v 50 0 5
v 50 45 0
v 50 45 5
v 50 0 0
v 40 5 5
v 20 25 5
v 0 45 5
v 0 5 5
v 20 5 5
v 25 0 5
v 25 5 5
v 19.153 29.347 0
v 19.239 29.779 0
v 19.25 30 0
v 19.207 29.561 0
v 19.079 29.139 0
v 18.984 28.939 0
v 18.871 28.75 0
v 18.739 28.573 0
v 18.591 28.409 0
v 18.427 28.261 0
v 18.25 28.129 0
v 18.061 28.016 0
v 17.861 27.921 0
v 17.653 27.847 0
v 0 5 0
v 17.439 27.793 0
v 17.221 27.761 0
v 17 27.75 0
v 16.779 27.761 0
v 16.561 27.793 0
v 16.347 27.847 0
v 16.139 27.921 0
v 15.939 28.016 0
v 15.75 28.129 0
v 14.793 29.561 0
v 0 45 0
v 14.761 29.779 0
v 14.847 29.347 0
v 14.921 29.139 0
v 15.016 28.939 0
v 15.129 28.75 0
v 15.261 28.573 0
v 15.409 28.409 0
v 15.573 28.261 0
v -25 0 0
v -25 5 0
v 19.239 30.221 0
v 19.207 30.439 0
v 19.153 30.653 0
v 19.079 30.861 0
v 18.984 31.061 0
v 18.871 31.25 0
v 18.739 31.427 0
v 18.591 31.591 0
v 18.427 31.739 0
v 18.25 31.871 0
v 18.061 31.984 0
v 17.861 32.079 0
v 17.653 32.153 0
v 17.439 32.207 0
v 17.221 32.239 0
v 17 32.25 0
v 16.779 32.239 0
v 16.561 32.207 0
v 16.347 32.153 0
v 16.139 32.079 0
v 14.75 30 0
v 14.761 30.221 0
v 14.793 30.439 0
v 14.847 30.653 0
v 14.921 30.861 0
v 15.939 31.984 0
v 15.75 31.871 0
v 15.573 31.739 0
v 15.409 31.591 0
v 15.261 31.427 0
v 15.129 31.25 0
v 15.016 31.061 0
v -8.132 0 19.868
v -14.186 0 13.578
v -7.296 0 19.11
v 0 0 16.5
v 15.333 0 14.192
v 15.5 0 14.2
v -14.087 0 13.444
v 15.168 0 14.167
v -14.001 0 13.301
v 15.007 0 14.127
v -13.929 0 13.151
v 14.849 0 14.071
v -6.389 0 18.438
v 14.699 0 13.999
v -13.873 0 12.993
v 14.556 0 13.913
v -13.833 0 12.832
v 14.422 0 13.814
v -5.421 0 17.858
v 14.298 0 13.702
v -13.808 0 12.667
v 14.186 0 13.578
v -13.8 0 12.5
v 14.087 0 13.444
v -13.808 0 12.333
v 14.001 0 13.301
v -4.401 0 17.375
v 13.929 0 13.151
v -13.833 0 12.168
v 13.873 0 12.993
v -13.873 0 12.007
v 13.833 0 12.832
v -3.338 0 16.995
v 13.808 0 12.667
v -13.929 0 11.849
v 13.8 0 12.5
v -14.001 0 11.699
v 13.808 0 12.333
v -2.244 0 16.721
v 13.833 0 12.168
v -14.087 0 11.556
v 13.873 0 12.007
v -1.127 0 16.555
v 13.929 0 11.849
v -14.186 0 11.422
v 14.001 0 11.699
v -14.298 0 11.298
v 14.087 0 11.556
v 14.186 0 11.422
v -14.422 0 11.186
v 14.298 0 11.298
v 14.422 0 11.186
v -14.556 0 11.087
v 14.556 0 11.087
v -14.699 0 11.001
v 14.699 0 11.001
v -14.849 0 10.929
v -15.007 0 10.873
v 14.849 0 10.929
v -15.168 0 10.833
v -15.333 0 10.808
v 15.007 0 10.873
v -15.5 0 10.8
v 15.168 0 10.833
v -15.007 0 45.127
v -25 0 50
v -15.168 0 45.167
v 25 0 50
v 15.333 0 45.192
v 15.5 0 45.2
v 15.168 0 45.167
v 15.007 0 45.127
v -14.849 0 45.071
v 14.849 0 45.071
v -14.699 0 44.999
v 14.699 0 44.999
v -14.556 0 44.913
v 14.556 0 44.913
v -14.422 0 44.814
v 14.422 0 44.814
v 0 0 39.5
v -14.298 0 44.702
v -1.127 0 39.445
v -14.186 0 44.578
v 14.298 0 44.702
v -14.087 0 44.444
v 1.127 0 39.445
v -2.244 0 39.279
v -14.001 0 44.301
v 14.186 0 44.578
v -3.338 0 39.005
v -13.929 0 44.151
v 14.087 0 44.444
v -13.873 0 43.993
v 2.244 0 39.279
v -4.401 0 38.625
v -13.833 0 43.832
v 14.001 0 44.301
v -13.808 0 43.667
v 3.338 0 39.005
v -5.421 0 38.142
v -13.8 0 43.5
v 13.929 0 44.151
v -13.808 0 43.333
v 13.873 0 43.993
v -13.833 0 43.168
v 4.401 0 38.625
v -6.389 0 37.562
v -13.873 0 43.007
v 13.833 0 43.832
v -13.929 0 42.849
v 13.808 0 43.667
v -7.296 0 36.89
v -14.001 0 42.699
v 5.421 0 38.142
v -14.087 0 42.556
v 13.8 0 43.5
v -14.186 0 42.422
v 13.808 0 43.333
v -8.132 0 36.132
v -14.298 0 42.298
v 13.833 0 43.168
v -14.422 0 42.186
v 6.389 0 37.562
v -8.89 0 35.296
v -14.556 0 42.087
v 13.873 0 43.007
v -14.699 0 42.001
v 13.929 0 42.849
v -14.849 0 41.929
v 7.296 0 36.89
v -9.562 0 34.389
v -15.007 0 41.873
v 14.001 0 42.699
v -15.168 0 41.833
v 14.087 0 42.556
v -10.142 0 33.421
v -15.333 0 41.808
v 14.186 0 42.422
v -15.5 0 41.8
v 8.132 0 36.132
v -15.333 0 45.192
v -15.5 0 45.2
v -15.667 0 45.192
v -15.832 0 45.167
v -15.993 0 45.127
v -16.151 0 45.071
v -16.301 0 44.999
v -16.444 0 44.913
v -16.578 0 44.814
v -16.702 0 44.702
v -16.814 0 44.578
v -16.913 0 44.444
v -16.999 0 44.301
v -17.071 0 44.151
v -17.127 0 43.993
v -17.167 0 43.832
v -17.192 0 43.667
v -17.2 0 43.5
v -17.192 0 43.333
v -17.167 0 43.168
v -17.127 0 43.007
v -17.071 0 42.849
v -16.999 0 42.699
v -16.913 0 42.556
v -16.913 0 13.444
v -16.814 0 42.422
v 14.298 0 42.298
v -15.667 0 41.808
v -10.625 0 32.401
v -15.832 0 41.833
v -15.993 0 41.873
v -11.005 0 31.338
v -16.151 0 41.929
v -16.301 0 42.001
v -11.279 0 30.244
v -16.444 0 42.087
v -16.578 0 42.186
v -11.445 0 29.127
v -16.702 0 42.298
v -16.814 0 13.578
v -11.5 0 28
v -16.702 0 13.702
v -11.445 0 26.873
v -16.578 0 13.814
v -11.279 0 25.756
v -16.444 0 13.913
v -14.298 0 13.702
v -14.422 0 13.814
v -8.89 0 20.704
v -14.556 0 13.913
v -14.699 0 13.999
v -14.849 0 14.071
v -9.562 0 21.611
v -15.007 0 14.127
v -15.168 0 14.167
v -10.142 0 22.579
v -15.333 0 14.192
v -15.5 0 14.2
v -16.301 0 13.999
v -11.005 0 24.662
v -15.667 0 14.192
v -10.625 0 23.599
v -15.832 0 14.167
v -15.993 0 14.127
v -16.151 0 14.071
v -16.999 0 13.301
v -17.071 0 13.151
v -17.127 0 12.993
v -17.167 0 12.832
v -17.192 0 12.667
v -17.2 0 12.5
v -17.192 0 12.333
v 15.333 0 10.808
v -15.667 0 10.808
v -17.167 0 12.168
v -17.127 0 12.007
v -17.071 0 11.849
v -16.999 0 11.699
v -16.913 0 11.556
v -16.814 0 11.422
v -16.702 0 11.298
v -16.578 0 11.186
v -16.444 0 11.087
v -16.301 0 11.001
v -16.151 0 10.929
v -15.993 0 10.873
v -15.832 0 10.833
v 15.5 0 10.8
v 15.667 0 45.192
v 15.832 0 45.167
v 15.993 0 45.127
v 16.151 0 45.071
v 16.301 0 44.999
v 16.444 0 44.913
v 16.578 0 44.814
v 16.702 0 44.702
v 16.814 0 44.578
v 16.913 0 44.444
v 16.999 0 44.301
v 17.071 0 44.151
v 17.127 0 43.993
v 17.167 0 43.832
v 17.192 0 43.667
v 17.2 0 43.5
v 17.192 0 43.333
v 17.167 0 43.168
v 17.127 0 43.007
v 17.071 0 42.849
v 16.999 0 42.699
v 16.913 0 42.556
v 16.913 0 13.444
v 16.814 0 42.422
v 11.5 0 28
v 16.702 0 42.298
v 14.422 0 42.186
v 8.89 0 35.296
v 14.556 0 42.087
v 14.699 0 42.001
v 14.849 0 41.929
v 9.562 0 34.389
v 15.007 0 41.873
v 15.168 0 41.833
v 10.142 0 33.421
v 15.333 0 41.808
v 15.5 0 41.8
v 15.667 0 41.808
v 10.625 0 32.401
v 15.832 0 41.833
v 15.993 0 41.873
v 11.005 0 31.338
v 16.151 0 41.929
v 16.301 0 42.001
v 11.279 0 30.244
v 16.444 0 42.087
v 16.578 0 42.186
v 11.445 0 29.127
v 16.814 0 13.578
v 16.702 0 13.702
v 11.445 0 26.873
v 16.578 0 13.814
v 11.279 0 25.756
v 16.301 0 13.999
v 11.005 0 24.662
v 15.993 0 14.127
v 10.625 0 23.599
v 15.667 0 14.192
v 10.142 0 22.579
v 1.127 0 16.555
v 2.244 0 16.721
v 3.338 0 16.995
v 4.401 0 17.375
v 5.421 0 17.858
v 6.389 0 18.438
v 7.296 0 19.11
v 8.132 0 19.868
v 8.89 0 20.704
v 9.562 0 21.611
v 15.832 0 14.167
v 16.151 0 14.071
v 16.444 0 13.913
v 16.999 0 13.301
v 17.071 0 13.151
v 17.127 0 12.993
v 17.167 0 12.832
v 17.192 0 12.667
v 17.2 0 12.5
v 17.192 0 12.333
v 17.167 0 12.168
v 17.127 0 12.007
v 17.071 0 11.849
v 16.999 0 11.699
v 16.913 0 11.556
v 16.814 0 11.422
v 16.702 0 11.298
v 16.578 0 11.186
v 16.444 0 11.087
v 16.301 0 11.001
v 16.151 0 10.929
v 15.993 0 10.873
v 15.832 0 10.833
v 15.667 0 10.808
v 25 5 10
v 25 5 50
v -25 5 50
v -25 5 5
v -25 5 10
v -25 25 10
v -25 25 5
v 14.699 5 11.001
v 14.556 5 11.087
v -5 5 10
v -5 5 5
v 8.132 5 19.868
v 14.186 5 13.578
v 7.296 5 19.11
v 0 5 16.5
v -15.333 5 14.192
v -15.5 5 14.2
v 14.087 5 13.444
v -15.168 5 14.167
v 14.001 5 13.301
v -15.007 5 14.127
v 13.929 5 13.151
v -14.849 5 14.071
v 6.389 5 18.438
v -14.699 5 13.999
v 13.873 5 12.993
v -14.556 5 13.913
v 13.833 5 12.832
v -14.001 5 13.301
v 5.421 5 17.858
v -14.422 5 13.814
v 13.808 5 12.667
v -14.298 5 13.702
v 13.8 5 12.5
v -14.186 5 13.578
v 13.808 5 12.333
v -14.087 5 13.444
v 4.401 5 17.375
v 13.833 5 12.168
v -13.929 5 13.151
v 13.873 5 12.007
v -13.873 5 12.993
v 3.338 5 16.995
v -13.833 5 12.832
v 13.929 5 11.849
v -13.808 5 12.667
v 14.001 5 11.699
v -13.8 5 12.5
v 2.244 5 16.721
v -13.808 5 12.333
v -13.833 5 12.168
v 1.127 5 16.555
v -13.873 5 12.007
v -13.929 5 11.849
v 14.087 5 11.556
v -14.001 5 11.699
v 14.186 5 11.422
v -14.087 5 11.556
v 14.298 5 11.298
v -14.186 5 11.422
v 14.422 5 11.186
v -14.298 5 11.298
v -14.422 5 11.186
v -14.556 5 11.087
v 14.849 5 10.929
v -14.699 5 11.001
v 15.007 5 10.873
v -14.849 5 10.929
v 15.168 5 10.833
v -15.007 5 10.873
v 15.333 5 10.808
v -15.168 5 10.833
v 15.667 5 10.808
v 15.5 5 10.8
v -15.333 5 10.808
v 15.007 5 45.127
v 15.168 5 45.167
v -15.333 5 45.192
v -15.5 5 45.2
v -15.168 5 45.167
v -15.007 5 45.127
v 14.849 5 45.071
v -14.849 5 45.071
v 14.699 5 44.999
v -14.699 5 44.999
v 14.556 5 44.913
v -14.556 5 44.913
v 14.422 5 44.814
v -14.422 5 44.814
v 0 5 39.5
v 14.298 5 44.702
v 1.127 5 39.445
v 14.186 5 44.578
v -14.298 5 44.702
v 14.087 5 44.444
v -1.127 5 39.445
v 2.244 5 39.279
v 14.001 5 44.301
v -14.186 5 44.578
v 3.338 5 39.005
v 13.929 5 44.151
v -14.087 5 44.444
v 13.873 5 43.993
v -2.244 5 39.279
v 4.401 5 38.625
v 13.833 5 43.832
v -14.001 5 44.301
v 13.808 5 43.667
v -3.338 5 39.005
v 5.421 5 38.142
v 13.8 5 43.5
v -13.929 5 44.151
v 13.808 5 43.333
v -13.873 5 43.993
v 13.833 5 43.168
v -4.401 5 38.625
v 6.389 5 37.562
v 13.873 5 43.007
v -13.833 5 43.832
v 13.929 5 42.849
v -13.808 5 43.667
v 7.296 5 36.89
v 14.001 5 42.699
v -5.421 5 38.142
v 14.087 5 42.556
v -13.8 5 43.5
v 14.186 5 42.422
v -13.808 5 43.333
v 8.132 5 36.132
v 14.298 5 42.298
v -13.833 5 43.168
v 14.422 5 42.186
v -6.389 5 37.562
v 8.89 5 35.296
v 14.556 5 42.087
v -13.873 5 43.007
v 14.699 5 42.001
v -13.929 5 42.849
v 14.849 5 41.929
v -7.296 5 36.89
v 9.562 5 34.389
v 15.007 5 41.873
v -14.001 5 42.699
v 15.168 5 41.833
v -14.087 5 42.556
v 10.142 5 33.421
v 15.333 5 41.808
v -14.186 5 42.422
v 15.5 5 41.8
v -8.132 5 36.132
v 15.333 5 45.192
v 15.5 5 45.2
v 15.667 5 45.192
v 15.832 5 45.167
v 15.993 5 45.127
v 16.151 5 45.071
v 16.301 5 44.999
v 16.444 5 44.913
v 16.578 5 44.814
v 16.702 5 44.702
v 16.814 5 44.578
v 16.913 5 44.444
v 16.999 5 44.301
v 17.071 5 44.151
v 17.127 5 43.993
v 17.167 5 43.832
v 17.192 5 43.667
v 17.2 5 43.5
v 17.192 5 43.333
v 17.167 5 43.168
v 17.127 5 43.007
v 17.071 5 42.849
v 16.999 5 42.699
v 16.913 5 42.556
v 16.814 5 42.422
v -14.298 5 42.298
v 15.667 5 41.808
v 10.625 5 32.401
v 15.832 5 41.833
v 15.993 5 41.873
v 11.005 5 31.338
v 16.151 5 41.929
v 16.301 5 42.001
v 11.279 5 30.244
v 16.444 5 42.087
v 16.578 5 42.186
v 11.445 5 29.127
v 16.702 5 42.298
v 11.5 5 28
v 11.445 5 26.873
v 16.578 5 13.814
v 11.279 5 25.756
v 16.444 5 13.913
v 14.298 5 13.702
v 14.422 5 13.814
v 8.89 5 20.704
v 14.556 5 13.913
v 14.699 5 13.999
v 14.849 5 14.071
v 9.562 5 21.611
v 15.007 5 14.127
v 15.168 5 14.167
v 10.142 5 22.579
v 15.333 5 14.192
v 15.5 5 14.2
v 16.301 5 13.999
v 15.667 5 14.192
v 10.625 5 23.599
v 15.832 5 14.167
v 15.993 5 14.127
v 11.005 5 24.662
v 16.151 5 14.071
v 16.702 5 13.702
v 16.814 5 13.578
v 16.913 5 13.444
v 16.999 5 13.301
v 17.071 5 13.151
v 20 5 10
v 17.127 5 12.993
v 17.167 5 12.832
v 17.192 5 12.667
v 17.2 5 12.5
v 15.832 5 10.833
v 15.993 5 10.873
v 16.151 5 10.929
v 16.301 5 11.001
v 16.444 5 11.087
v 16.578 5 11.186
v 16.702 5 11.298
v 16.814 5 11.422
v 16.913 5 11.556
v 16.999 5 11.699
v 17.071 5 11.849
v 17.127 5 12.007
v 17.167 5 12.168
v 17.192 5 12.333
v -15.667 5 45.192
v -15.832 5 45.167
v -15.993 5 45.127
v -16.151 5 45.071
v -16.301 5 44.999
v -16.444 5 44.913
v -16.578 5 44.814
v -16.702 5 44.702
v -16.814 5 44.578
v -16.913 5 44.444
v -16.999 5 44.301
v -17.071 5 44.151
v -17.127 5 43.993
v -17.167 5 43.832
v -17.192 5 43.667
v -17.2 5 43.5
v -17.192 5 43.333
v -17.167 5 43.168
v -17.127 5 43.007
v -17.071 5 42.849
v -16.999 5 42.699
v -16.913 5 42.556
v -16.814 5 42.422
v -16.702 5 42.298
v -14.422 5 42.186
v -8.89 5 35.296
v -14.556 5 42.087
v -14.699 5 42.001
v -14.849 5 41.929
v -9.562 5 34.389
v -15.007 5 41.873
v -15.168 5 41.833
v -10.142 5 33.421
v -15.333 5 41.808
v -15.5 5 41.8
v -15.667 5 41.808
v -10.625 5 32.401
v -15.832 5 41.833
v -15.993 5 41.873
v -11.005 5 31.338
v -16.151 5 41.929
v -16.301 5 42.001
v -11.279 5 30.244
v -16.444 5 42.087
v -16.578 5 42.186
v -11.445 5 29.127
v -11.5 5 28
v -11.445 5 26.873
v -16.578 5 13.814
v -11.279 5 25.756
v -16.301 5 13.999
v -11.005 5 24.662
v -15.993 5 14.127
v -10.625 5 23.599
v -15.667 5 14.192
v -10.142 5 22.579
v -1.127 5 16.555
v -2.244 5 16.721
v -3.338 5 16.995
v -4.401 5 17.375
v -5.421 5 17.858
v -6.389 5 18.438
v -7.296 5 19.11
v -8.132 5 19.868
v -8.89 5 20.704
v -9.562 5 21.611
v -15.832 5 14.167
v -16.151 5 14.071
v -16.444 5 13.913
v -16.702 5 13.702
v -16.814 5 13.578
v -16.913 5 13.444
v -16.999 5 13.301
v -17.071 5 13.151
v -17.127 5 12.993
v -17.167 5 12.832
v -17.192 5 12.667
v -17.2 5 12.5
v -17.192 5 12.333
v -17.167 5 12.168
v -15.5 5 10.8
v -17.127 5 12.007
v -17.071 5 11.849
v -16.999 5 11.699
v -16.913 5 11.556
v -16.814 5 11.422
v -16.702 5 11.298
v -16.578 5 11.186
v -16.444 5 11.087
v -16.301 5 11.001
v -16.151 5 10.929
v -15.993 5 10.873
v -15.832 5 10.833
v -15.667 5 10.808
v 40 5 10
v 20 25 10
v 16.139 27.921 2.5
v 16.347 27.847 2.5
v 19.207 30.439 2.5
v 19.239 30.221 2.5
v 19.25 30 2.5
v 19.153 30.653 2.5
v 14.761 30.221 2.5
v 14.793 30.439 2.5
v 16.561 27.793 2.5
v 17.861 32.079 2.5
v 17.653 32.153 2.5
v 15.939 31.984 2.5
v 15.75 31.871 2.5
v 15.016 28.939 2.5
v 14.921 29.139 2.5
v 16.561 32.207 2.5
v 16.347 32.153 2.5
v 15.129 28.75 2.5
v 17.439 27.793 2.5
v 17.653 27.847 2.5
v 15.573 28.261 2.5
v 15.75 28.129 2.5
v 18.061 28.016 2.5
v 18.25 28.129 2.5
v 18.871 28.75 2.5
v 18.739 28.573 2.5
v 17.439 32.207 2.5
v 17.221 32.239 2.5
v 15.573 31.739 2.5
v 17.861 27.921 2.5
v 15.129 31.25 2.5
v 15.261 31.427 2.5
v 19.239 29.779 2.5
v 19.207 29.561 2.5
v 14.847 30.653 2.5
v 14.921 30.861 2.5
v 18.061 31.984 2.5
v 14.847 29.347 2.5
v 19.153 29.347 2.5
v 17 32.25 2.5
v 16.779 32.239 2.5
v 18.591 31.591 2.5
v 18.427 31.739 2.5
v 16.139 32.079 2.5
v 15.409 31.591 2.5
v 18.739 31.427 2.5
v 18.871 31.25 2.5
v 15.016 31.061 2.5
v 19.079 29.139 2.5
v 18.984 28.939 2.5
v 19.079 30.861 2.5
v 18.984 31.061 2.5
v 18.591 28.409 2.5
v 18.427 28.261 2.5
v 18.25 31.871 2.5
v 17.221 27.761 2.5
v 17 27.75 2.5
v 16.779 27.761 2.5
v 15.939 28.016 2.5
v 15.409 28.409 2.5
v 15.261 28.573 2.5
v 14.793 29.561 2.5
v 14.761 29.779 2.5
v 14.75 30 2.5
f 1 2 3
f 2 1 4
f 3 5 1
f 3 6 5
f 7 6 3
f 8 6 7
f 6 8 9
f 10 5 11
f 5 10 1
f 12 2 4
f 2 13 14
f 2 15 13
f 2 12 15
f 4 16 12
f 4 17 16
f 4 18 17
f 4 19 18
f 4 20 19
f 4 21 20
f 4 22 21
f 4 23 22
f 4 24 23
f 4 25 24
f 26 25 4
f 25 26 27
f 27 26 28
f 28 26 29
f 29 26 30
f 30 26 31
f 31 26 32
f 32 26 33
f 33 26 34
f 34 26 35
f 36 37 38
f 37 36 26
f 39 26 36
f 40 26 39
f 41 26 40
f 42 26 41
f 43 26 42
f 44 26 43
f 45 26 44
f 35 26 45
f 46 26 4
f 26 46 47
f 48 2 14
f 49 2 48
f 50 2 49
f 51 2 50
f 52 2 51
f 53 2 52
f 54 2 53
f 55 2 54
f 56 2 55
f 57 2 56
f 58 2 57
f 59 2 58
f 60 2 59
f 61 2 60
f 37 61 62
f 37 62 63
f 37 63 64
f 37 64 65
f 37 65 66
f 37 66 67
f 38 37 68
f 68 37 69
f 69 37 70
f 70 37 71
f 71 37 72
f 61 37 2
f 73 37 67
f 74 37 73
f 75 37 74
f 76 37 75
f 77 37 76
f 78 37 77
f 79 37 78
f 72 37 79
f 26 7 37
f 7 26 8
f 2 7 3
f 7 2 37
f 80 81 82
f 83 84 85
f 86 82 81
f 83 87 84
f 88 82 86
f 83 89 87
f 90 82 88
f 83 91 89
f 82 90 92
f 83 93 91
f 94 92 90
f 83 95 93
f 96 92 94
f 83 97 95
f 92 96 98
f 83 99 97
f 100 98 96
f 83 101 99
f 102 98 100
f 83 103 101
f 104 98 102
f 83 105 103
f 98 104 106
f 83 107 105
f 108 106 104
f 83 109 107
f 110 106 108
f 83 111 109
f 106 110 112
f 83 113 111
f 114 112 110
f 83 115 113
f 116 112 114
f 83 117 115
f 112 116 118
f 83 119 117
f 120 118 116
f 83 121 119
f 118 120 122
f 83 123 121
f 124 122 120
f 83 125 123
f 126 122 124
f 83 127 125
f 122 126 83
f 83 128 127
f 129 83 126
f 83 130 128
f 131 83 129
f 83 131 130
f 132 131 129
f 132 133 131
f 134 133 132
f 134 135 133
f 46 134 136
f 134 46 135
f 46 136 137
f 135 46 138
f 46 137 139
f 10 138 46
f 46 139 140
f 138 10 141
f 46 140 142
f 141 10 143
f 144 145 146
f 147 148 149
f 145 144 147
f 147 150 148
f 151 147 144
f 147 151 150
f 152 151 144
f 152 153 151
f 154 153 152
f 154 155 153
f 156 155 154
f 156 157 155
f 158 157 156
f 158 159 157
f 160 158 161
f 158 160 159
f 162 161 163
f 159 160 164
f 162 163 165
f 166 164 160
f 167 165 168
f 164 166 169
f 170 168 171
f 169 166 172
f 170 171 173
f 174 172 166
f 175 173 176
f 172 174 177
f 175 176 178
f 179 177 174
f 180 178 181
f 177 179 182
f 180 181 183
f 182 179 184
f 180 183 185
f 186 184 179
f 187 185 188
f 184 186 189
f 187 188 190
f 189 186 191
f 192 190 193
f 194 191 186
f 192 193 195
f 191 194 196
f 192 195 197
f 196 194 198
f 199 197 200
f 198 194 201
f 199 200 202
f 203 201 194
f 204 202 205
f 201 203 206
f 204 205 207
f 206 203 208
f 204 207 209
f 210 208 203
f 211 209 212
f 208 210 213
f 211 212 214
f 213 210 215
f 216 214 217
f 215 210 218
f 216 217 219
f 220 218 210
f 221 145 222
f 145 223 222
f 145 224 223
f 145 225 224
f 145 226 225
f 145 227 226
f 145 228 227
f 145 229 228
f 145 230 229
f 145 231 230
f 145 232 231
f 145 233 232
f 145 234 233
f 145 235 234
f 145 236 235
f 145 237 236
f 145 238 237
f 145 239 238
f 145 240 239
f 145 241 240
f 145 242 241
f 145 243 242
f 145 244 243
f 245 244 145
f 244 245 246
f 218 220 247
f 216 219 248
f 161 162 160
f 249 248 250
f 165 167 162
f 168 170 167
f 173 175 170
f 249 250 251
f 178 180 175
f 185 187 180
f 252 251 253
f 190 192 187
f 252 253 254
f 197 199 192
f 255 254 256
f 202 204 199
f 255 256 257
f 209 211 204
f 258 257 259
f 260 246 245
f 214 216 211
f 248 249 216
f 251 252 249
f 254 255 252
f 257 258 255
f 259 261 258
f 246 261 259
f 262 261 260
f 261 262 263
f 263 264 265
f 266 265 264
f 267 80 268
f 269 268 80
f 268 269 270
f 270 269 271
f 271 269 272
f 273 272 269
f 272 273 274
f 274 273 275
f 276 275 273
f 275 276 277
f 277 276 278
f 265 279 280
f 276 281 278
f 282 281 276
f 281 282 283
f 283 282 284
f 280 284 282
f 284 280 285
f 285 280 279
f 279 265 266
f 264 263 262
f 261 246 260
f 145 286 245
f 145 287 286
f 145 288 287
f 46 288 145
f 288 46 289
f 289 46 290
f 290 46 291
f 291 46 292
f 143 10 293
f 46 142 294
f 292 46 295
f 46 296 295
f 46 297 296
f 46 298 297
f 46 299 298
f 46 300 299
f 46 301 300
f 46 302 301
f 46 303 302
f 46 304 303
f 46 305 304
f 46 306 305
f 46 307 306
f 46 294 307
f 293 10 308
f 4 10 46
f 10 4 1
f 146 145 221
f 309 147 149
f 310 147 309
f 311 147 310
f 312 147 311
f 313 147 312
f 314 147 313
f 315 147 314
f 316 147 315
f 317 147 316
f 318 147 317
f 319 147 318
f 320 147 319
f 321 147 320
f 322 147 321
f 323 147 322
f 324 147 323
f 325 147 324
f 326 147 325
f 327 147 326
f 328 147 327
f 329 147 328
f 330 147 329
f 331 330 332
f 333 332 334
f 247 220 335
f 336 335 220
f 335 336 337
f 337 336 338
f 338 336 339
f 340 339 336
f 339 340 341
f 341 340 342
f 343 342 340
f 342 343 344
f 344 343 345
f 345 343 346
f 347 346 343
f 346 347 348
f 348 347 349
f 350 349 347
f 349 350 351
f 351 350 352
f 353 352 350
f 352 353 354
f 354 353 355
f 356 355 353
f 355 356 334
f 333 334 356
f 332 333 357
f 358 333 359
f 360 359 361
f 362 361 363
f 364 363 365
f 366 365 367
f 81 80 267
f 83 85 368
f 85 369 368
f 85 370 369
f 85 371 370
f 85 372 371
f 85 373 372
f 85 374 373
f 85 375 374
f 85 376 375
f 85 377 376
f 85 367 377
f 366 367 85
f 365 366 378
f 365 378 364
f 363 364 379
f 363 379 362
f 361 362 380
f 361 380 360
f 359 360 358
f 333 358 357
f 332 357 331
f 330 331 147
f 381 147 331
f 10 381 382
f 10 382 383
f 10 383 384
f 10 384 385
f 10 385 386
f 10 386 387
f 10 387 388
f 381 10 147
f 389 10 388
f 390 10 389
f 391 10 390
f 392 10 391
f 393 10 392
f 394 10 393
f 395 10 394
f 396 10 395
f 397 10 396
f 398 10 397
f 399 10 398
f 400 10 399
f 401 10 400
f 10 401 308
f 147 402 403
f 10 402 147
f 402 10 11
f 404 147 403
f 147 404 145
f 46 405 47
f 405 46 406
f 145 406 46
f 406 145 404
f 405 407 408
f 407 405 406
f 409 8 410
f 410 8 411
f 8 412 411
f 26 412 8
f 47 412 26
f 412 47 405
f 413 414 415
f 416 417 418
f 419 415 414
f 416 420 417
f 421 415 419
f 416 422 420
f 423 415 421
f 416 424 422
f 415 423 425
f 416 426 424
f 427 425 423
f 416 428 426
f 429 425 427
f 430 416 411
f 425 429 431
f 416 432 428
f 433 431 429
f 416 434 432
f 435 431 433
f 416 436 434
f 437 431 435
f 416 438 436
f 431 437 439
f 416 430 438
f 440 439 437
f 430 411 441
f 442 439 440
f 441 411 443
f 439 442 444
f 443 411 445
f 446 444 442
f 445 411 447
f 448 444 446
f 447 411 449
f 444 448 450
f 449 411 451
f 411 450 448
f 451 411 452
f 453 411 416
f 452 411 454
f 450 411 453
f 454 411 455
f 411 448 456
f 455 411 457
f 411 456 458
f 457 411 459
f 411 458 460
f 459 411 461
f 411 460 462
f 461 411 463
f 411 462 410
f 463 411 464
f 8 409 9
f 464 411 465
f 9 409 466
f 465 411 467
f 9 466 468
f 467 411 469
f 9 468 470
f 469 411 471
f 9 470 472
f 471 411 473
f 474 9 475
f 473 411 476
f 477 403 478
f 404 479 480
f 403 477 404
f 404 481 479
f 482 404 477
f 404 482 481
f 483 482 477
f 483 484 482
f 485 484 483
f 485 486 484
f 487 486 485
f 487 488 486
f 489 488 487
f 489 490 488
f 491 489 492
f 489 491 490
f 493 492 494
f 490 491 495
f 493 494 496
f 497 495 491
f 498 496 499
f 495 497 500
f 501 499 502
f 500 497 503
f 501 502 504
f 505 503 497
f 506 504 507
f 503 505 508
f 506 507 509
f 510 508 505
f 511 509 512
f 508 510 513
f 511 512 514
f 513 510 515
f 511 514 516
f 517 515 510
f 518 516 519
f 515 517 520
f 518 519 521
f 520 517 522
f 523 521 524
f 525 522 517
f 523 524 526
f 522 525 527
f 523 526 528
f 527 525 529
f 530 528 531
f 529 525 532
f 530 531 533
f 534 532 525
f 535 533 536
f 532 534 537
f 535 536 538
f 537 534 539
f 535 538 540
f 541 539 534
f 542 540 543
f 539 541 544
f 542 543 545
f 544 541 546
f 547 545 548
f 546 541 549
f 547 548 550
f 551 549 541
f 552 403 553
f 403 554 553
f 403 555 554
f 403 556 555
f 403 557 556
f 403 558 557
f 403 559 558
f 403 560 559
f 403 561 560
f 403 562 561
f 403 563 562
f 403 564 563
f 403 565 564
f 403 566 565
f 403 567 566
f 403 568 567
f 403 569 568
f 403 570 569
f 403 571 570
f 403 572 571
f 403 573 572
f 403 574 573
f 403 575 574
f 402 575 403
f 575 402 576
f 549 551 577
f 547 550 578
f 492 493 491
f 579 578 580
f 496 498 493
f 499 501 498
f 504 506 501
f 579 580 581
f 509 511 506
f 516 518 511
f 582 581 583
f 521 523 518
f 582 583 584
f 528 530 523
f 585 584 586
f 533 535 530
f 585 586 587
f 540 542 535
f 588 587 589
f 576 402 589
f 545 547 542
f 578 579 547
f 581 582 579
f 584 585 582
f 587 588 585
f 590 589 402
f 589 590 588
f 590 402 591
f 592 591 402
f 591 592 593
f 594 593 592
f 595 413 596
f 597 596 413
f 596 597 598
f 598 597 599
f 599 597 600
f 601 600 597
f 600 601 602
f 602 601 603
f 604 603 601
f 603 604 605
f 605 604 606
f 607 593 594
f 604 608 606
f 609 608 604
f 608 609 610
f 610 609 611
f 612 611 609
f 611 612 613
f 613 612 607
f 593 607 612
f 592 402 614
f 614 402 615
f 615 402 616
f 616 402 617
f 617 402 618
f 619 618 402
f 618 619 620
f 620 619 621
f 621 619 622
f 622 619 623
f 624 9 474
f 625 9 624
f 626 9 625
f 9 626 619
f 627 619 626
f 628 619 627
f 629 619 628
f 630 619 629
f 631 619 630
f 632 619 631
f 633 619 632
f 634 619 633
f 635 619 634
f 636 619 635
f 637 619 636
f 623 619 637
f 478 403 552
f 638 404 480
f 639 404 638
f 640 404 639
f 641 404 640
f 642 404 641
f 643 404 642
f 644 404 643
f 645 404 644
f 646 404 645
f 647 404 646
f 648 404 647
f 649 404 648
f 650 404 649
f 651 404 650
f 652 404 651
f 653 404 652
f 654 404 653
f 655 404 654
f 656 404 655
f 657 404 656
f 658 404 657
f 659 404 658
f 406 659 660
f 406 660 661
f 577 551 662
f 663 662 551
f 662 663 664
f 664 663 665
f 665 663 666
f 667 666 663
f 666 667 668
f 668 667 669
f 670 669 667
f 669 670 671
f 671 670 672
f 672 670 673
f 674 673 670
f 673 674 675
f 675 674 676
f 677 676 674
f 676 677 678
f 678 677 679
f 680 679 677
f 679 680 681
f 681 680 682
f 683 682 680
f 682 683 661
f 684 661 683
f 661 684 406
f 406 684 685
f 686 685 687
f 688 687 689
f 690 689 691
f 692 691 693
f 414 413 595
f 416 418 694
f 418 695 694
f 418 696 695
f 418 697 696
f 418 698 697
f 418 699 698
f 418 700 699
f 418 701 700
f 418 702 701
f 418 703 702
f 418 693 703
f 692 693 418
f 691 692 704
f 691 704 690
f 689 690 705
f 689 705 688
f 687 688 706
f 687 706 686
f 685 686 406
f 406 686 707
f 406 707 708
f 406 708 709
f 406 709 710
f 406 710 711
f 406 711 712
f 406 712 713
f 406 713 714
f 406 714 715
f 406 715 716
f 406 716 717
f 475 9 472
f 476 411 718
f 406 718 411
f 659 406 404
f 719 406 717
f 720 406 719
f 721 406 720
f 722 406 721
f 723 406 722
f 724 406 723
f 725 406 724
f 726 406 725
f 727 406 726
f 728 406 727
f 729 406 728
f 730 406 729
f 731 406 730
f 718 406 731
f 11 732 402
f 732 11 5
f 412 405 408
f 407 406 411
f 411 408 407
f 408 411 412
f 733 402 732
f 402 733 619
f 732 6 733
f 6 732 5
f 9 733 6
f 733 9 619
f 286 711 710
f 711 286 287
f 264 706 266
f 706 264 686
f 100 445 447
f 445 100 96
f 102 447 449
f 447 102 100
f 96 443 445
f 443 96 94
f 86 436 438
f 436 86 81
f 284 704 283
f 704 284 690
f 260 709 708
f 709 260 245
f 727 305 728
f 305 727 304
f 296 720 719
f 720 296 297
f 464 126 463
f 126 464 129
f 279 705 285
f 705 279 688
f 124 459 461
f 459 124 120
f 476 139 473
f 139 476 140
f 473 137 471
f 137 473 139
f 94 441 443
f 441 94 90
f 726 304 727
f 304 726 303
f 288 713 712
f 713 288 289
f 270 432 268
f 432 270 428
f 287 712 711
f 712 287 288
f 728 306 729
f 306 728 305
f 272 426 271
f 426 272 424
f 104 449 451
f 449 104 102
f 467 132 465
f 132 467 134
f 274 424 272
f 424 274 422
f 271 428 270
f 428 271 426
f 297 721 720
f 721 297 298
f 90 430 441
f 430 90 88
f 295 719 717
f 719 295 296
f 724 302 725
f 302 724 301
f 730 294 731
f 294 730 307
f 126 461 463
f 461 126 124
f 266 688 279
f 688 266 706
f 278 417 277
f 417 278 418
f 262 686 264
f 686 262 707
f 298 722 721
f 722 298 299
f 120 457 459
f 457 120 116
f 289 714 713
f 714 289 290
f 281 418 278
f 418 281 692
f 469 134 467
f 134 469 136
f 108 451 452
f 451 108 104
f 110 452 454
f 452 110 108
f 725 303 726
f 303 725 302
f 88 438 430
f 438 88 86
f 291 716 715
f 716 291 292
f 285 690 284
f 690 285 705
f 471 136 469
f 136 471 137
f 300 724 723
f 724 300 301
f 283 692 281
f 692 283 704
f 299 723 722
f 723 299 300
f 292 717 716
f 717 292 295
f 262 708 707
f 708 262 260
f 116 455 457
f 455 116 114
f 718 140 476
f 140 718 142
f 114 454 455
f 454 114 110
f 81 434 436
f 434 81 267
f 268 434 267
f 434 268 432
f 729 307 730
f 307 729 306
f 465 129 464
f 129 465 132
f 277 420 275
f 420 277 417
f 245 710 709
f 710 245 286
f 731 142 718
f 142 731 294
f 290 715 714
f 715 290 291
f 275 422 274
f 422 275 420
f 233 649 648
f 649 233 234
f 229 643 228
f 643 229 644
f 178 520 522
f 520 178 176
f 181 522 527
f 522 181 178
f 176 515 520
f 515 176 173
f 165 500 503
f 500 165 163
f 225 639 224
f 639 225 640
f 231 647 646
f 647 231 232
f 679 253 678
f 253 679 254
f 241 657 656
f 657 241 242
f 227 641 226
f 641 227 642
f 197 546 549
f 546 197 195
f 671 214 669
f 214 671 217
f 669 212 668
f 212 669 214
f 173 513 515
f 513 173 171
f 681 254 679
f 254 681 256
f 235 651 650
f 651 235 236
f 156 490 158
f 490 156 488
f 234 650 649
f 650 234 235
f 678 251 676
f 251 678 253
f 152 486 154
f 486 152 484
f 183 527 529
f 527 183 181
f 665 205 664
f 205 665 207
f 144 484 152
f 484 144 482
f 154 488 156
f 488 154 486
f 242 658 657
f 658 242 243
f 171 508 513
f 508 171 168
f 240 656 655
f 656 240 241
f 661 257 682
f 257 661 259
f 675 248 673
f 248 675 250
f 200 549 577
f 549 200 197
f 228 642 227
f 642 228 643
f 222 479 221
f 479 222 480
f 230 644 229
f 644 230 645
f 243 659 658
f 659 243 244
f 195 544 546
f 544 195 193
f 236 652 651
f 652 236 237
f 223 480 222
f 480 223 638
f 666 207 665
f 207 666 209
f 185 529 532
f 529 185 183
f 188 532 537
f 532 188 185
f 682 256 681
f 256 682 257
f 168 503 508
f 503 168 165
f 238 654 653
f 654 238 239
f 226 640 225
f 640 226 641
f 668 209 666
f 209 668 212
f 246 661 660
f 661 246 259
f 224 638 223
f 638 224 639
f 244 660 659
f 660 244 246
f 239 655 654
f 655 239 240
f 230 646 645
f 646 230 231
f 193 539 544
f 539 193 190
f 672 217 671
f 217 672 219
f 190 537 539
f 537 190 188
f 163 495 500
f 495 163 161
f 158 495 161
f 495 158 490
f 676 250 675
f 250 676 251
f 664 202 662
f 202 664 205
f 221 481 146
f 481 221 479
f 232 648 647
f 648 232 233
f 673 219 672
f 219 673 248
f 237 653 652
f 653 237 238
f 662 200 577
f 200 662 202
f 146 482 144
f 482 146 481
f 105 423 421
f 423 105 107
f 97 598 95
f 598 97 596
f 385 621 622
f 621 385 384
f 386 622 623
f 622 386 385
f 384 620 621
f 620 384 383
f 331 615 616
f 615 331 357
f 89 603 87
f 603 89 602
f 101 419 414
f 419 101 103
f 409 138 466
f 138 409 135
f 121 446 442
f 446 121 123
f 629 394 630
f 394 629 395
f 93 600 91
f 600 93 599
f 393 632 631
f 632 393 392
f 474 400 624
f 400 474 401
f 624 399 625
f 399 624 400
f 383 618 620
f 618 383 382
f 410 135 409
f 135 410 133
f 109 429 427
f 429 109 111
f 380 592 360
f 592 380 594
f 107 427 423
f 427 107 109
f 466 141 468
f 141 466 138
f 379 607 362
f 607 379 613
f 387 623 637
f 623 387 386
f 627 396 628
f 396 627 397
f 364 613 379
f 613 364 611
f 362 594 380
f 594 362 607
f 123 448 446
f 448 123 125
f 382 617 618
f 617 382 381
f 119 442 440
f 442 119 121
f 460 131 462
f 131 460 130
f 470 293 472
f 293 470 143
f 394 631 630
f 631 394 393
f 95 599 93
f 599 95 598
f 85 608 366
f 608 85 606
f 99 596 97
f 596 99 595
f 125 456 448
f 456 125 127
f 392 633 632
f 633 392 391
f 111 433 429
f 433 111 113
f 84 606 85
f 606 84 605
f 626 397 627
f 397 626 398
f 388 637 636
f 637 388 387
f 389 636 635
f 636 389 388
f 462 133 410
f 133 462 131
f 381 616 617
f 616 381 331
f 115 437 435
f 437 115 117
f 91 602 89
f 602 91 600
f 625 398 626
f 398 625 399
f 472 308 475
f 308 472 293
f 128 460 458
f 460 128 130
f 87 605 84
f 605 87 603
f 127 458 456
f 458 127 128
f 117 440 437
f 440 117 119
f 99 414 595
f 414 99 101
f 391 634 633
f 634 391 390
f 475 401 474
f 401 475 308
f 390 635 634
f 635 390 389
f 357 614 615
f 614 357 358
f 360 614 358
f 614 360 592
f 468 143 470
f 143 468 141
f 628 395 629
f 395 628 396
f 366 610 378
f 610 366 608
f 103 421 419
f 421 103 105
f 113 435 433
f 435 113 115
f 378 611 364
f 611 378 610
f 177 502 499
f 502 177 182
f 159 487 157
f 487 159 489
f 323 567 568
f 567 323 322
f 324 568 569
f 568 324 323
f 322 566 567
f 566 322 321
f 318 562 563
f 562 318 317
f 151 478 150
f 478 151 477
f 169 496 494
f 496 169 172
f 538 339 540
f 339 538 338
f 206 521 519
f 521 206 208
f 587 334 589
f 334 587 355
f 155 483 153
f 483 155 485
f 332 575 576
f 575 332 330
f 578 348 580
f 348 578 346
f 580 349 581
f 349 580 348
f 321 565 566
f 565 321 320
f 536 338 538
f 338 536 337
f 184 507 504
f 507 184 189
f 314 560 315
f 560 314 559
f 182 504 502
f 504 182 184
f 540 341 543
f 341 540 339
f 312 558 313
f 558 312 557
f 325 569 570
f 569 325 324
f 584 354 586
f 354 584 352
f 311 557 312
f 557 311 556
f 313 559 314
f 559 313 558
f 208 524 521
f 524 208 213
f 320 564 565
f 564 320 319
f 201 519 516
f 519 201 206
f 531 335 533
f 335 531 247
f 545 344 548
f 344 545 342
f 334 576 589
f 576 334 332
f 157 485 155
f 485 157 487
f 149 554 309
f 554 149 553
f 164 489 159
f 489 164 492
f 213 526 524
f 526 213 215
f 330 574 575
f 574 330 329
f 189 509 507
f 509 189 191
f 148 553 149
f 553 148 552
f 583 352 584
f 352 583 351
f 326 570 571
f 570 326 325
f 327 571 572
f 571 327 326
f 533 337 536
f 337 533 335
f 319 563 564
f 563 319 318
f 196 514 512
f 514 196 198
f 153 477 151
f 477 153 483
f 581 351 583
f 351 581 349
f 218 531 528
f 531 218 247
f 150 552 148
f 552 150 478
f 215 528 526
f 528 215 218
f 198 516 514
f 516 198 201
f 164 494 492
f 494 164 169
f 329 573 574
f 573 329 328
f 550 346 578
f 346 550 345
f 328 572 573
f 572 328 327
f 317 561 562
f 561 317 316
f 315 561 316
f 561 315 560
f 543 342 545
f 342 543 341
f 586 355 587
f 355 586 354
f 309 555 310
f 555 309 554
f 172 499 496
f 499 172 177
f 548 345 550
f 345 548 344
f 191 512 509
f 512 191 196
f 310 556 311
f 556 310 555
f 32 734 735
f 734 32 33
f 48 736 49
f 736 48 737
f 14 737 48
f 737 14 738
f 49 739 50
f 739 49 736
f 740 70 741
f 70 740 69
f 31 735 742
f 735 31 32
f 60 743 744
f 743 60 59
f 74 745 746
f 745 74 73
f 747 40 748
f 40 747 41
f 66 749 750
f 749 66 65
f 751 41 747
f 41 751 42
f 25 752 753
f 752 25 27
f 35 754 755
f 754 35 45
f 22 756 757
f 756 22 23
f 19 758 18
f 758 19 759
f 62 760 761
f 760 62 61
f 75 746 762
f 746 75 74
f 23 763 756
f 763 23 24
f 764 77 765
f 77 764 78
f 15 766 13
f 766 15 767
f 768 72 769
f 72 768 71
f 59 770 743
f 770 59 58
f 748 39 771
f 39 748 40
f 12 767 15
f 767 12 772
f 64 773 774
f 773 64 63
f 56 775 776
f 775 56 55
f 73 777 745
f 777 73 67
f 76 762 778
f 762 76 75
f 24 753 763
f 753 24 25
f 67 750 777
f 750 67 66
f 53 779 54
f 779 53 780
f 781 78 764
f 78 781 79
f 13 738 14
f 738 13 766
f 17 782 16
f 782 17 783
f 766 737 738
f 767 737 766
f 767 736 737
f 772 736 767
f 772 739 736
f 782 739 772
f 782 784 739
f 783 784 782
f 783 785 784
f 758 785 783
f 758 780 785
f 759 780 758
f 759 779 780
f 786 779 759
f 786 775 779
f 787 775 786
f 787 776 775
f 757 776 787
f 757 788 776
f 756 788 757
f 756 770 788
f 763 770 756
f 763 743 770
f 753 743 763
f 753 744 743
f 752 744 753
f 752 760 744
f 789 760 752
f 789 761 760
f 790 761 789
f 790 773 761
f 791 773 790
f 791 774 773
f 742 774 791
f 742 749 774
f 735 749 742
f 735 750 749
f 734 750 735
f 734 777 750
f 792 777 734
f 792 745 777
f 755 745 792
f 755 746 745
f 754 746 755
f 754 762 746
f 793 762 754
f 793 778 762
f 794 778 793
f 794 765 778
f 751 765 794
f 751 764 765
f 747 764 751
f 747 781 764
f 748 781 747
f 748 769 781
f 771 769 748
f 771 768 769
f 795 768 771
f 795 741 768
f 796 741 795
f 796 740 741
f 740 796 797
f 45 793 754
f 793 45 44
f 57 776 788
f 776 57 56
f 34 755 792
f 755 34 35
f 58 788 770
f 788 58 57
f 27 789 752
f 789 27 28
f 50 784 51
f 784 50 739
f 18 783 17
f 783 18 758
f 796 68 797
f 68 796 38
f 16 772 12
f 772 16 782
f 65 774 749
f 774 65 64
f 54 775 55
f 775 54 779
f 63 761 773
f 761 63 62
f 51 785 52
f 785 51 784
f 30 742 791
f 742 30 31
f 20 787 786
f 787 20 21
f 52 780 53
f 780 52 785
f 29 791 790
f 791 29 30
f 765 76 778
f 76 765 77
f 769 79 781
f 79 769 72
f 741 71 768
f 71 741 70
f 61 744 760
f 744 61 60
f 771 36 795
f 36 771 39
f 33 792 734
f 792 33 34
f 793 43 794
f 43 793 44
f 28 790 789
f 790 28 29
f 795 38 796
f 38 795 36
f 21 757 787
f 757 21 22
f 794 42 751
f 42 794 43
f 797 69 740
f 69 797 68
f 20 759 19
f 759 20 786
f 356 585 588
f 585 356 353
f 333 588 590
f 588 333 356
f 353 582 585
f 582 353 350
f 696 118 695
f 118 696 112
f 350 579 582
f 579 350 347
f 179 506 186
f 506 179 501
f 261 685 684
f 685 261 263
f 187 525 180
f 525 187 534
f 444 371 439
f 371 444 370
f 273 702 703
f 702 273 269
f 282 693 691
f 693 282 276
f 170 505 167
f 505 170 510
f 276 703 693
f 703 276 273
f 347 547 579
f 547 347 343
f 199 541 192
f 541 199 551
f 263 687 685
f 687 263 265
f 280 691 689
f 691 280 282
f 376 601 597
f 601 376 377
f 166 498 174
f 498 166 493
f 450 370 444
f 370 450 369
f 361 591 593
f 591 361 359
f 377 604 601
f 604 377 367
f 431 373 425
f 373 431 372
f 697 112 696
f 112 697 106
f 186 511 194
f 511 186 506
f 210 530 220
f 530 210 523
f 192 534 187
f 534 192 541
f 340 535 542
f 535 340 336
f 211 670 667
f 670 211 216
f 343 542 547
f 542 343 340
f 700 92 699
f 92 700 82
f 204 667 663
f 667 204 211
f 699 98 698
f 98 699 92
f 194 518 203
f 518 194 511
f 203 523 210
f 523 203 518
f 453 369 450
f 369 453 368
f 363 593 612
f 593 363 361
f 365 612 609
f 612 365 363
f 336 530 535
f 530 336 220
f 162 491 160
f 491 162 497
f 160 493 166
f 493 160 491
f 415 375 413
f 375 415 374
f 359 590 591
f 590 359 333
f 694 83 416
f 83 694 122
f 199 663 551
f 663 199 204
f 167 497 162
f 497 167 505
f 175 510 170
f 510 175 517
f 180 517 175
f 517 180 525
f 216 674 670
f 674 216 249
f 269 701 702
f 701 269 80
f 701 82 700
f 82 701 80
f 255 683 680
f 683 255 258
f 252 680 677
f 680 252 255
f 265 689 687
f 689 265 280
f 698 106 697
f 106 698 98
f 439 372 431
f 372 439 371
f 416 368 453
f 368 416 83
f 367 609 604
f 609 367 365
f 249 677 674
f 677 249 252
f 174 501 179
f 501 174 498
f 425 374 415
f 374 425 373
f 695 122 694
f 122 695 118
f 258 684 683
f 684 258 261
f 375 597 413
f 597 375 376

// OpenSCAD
// NEMA 17 L-Bracket for Syringe Pump
// Print orientation: Base on bed (XY plane), building up Z.

// --- Dimensions ---
// Base Plate
base_x_min = -25;
base_x_max = 25;
base_y_min = 0;
base_y_max = 45;
base_z = 5;

// Vertical Motor Plate
vert_x_min = -25;
vert_x_max = 25;
vert_y_min = 0;
vert_y_max = 5;
vert_z = 50;

// Base Holes (M4)
base_hole_dia = 4.5;
base_hole_y = 30;
base_hole_x_offset = 17;

// Motor Boss Hole
boss_hole_dia = 23;
boss_hole_z = 28;

// Motor Mount Holes (M3)
mount_hole_dia = 3.4;
mount_pattern_size = 31; // Square pattern side length
mount_pattern_offset = mount_pattern_size / 2;

// Gussets
gusset_thickness = 5;
gusset_leg = 20;
gusset_x_start = 20; // Distance from center to start of gusset (25 - 5)
gusset_x_end = 25;

// --- Settings ---
$fn = 64; // High resolution for round holes

// --- Main Structure ---
difference() {
    union() {
        // 1. Base Plate
        // Centered on X: -25 to 25. Y: 0 to 45. Z: 0 to 5.
        translate([0, 0, 0])
            cube([base_x_max - base_x_min, base_y_max - base_y_min, base_z], center = [base_x_min + (base_x_max - base_x_min)/2, base_y_min, 0]);

        // 2. Vertical Motor Plate
        // X: -25 to 25. Y: 0 to 5. Z: 0 to 50.
        // Stands on the back edge (y=0).
        translate([vert_x_min, vert_y_min, 0])
            cube([vert_x_max - vert_x_min, vert_y_max - vert_y_min, vert_z]);

        // 3. Gussets
        // Left Gusset: x from -25 to -20.
        // Right triangle in YZ plane.
        // Right angle at y=5, z=5. Legs +Y and +Z.
        // Translate to x=-25, y=5, z=5.
        translate([base_x_min, vert_y_max, base_z]) {
            linear_extrude(height = gusset_thickness, convexity = 10)
                polygon(points = [
                    [0, 0], // Corner at y=5, z=5 (relative to start)
                    [gusset_leg, 0], // Along +Y
                    [0, gusset_leg]  // Along +Z
                ]);
        }

        // Right Gusset: x from 20 to 25.
        // Translate to x=20, y=5, z=5.
        translate([base_x_max - gusset_thickness, vert_y_max, base_z]) {
            linear_extrude(height = gusset_thickness, convexity = 10)
                polygon(points = [
                    [0, 0], // Corner at y=5, z=5 (relative to start)
                    [gusset_leg, 0], // Along +Y
                    [0, gusset_leg]  // Along +Z
                ]);
        }
    }

    // --- Cuts ---

    // 1. Base Plate Holes (M4)
    // Hole 1
    translate([-base_hole_x_offset, base_hole_y, -1])
        cylinder(h = base_z + 2, r = base_hole_dia / 2, center = true);
    // Hole 2
    translate([base_hole_x_offset, base_hole_y, -1])
        cylinder(h = base_z + 2, r = base_hole_dia / 2, center = true);

    // 2. Motor Boss Hole (Through Y)
    // Center at x=0, z=28. Cuts through the vertical plate (y 0 to 5).
    translate([0, vert_y_min + (vert_y_max - vert_y_min)/2, boss_hole_z])
        rotate([90, 0, 0]) // Rotate to align cylinder along Y
        cylinder(h = vert_y_max - vert_y_min + 2, r = boss_hole_dia / 2, center = true);

    // 3. Motor Mount Holes (M3)
    // 4 holes on a 31mm square pattern centered on the boss hole (x=0, z=28)
    // Pattern is in the XZ plane of the vertical plate.
    // Holes go through Y.
    for (dx = [-mount_pattern_offset, mount_pattern_offset]) {
        for (dz = [-mount_pattern_offset, mount_pattern_offset]) {
            translate([dx, vert_y_min + (vert_y_max - vert_y_min)/2, boss_hole_z + dz])
                rotate([90, 0, 0]) // Align along Y
                cylinder(h = vert_y_max - vert_y_min + 2, r = mount_hole_dia / 2, center = true);
        }
    }
}
